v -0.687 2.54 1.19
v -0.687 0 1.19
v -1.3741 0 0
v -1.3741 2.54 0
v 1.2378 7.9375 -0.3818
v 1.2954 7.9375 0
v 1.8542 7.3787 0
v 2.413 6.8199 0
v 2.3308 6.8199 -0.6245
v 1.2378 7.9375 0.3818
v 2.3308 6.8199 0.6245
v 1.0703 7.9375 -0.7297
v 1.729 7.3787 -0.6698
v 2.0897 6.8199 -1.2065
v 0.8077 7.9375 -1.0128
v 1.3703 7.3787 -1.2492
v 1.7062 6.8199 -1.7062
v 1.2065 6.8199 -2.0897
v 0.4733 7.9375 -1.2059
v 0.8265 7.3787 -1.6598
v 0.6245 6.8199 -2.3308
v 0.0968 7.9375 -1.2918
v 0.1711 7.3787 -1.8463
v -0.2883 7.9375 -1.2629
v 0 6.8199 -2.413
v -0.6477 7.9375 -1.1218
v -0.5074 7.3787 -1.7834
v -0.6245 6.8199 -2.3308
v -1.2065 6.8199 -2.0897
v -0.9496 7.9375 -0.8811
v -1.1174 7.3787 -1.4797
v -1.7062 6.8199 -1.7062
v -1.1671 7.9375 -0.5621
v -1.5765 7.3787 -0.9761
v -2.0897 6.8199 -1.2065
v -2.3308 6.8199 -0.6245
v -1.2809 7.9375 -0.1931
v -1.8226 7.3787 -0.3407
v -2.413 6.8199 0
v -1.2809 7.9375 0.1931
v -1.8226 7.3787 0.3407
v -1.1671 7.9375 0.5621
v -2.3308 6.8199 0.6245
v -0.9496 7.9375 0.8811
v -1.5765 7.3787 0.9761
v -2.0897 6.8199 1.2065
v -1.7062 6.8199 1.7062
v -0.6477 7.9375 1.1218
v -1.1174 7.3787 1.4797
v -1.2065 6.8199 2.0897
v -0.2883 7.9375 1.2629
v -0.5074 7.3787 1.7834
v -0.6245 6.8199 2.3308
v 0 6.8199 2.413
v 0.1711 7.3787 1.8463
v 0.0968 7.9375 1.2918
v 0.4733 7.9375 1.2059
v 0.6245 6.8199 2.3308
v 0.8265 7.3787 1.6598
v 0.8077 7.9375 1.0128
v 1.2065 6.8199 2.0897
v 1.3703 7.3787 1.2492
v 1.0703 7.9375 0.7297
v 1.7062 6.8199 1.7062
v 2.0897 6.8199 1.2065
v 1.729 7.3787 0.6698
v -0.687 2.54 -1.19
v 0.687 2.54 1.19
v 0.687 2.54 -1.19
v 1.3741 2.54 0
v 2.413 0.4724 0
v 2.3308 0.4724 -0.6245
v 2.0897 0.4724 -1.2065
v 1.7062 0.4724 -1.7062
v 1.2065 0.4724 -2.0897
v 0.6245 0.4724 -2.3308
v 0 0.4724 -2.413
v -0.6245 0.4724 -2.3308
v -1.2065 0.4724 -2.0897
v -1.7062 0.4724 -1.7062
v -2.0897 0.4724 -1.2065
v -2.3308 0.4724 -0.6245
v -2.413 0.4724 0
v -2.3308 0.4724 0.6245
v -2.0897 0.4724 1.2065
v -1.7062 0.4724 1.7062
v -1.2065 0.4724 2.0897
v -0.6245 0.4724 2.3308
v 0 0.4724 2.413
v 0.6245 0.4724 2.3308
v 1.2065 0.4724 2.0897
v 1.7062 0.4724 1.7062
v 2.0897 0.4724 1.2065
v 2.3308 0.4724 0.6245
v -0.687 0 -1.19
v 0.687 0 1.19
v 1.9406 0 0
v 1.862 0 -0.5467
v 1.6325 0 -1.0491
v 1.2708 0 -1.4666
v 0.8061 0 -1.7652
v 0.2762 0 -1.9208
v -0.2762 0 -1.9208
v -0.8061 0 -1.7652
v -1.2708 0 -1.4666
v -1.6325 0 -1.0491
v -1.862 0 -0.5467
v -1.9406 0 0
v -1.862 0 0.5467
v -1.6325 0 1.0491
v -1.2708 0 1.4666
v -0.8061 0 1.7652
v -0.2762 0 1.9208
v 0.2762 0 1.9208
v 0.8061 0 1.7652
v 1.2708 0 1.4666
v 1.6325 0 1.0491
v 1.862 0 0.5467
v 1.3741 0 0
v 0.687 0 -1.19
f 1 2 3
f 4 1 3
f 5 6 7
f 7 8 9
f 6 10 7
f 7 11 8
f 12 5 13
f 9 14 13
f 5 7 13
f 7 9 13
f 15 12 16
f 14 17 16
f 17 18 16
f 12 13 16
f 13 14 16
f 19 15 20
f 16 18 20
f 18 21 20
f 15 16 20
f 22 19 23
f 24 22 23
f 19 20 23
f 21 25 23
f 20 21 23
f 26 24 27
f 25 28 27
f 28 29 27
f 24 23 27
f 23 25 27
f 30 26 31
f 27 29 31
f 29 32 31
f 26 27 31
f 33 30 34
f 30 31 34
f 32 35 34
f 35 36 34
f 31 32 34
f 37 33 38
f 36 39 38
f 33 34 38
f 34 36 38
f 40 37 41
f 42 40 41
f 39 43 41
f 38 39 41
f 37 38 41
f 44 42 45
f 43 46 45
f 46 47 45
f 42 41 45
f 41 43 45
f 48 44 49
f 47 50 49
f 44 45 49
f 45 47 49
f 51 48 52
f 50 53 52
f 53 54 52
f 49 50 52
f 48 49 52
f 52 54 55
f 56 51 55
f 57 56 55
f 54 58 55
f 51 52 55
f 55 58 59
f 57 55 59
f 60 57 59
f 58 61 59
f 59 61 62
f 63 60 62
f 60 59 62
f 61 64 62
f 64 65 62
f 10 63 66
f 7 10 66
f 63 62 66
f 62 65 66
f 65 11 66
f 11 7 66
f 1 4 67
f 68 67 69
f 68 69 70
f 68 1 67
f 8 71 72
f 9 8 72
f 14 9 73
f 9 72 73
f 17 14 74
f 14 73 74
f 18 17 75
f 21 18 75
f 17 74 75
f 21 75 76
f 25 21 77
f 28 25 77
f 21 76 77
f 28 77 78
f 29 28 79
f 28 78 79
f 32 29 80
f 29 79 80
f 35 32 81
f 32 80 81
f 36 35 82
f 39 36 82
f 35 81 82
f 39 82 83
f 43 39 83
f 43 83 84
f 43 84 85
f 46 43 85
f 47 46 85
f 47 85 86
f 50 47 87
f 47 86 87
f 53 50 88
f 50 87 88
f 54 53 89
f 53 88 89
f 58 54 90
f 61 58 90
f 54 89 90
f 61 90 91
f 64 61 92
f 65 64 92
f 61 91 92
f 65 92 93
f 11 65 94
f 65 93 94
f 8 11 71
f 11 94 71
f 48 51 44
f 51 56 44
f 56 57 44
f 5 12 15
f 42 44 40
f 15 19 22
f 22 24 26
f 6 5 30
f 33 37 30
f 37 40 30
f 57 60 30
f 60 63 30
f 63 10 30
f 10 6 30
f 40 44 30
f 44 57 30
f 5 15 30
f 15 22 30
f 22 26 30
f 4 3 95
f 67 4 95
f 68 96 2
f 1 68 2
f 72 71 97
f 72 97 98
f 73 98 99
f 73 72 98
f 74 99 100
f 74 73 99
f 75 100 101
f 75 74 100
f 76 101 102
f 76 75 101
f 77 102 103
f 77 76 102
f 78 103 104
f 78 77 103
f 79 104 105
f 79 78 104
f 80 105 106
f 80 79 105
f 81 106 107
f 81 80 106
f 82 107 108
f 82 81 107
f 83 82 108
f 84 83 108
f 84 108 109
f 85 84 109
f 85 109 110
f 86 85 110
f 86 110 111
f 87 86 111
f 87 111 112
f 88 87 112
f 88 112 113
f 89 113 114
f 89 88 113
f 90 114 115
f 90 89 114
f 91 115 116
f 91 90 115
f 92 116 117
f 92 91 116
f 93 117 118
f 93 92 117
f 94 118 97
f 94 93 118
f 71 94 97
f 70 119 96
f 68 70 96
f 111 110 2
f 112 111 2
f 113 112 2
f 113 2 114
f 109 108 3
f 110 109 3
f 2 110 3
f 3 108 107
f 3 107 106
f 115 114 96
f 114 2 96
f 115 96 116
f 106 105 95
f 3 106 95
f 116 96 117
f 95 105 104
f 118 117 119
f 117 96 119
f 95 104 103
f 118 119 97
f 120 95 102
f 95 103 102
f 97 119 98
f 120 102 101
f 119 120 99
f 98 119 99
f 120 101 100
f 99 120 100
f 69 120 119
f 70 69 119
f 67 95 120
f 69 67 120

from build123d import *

# Parameters (mm, degrees)
CUT_EXTRUDE1_DEPTH = 2.54
CHAMFER1_SIZE      = 0.47244


with BuildPart() as part:
    # Sketch1 → Revolve1 (revolve)
    with BuildSketch(Plane(origin=(0, 0, 0), x_dir=(-1, 0, 0), z_dir=(0, 0, -1))):
        Polygon((-2.413, 0), (0, 0), (0, 7.9375), (-1.2954, 7.9375), (-2.413, 6.8199), align=None)
    revolve(axis=Axis((0, 0, 0), (0, 1, 0)))

    # Sketch2 → Cut-Extrude1 (cut)
    with BuildSketch(Plane.XZ):
        Polygon((-0.68704079, 1.189989555), (-1.37408158, 0), (-0.68704079, -1.189989555), (0.68704079, -1.189989555), (1.37408158, 0), (0.68704079, 1.189989555), align=None)
    extrude(amount=-CUT_EXTRUDE1_DEPTH, mode=Mode.SUBTRACT)

    # Chamfer1
    chamfer1_edges = [part.edges().sort_by_distance(p)[0] for p in [
        (-2.413, 0, 0),
    ]]
    chamfer(chamfer1_edges, length=CHAMFER1_SIZE)


solid = part.part
